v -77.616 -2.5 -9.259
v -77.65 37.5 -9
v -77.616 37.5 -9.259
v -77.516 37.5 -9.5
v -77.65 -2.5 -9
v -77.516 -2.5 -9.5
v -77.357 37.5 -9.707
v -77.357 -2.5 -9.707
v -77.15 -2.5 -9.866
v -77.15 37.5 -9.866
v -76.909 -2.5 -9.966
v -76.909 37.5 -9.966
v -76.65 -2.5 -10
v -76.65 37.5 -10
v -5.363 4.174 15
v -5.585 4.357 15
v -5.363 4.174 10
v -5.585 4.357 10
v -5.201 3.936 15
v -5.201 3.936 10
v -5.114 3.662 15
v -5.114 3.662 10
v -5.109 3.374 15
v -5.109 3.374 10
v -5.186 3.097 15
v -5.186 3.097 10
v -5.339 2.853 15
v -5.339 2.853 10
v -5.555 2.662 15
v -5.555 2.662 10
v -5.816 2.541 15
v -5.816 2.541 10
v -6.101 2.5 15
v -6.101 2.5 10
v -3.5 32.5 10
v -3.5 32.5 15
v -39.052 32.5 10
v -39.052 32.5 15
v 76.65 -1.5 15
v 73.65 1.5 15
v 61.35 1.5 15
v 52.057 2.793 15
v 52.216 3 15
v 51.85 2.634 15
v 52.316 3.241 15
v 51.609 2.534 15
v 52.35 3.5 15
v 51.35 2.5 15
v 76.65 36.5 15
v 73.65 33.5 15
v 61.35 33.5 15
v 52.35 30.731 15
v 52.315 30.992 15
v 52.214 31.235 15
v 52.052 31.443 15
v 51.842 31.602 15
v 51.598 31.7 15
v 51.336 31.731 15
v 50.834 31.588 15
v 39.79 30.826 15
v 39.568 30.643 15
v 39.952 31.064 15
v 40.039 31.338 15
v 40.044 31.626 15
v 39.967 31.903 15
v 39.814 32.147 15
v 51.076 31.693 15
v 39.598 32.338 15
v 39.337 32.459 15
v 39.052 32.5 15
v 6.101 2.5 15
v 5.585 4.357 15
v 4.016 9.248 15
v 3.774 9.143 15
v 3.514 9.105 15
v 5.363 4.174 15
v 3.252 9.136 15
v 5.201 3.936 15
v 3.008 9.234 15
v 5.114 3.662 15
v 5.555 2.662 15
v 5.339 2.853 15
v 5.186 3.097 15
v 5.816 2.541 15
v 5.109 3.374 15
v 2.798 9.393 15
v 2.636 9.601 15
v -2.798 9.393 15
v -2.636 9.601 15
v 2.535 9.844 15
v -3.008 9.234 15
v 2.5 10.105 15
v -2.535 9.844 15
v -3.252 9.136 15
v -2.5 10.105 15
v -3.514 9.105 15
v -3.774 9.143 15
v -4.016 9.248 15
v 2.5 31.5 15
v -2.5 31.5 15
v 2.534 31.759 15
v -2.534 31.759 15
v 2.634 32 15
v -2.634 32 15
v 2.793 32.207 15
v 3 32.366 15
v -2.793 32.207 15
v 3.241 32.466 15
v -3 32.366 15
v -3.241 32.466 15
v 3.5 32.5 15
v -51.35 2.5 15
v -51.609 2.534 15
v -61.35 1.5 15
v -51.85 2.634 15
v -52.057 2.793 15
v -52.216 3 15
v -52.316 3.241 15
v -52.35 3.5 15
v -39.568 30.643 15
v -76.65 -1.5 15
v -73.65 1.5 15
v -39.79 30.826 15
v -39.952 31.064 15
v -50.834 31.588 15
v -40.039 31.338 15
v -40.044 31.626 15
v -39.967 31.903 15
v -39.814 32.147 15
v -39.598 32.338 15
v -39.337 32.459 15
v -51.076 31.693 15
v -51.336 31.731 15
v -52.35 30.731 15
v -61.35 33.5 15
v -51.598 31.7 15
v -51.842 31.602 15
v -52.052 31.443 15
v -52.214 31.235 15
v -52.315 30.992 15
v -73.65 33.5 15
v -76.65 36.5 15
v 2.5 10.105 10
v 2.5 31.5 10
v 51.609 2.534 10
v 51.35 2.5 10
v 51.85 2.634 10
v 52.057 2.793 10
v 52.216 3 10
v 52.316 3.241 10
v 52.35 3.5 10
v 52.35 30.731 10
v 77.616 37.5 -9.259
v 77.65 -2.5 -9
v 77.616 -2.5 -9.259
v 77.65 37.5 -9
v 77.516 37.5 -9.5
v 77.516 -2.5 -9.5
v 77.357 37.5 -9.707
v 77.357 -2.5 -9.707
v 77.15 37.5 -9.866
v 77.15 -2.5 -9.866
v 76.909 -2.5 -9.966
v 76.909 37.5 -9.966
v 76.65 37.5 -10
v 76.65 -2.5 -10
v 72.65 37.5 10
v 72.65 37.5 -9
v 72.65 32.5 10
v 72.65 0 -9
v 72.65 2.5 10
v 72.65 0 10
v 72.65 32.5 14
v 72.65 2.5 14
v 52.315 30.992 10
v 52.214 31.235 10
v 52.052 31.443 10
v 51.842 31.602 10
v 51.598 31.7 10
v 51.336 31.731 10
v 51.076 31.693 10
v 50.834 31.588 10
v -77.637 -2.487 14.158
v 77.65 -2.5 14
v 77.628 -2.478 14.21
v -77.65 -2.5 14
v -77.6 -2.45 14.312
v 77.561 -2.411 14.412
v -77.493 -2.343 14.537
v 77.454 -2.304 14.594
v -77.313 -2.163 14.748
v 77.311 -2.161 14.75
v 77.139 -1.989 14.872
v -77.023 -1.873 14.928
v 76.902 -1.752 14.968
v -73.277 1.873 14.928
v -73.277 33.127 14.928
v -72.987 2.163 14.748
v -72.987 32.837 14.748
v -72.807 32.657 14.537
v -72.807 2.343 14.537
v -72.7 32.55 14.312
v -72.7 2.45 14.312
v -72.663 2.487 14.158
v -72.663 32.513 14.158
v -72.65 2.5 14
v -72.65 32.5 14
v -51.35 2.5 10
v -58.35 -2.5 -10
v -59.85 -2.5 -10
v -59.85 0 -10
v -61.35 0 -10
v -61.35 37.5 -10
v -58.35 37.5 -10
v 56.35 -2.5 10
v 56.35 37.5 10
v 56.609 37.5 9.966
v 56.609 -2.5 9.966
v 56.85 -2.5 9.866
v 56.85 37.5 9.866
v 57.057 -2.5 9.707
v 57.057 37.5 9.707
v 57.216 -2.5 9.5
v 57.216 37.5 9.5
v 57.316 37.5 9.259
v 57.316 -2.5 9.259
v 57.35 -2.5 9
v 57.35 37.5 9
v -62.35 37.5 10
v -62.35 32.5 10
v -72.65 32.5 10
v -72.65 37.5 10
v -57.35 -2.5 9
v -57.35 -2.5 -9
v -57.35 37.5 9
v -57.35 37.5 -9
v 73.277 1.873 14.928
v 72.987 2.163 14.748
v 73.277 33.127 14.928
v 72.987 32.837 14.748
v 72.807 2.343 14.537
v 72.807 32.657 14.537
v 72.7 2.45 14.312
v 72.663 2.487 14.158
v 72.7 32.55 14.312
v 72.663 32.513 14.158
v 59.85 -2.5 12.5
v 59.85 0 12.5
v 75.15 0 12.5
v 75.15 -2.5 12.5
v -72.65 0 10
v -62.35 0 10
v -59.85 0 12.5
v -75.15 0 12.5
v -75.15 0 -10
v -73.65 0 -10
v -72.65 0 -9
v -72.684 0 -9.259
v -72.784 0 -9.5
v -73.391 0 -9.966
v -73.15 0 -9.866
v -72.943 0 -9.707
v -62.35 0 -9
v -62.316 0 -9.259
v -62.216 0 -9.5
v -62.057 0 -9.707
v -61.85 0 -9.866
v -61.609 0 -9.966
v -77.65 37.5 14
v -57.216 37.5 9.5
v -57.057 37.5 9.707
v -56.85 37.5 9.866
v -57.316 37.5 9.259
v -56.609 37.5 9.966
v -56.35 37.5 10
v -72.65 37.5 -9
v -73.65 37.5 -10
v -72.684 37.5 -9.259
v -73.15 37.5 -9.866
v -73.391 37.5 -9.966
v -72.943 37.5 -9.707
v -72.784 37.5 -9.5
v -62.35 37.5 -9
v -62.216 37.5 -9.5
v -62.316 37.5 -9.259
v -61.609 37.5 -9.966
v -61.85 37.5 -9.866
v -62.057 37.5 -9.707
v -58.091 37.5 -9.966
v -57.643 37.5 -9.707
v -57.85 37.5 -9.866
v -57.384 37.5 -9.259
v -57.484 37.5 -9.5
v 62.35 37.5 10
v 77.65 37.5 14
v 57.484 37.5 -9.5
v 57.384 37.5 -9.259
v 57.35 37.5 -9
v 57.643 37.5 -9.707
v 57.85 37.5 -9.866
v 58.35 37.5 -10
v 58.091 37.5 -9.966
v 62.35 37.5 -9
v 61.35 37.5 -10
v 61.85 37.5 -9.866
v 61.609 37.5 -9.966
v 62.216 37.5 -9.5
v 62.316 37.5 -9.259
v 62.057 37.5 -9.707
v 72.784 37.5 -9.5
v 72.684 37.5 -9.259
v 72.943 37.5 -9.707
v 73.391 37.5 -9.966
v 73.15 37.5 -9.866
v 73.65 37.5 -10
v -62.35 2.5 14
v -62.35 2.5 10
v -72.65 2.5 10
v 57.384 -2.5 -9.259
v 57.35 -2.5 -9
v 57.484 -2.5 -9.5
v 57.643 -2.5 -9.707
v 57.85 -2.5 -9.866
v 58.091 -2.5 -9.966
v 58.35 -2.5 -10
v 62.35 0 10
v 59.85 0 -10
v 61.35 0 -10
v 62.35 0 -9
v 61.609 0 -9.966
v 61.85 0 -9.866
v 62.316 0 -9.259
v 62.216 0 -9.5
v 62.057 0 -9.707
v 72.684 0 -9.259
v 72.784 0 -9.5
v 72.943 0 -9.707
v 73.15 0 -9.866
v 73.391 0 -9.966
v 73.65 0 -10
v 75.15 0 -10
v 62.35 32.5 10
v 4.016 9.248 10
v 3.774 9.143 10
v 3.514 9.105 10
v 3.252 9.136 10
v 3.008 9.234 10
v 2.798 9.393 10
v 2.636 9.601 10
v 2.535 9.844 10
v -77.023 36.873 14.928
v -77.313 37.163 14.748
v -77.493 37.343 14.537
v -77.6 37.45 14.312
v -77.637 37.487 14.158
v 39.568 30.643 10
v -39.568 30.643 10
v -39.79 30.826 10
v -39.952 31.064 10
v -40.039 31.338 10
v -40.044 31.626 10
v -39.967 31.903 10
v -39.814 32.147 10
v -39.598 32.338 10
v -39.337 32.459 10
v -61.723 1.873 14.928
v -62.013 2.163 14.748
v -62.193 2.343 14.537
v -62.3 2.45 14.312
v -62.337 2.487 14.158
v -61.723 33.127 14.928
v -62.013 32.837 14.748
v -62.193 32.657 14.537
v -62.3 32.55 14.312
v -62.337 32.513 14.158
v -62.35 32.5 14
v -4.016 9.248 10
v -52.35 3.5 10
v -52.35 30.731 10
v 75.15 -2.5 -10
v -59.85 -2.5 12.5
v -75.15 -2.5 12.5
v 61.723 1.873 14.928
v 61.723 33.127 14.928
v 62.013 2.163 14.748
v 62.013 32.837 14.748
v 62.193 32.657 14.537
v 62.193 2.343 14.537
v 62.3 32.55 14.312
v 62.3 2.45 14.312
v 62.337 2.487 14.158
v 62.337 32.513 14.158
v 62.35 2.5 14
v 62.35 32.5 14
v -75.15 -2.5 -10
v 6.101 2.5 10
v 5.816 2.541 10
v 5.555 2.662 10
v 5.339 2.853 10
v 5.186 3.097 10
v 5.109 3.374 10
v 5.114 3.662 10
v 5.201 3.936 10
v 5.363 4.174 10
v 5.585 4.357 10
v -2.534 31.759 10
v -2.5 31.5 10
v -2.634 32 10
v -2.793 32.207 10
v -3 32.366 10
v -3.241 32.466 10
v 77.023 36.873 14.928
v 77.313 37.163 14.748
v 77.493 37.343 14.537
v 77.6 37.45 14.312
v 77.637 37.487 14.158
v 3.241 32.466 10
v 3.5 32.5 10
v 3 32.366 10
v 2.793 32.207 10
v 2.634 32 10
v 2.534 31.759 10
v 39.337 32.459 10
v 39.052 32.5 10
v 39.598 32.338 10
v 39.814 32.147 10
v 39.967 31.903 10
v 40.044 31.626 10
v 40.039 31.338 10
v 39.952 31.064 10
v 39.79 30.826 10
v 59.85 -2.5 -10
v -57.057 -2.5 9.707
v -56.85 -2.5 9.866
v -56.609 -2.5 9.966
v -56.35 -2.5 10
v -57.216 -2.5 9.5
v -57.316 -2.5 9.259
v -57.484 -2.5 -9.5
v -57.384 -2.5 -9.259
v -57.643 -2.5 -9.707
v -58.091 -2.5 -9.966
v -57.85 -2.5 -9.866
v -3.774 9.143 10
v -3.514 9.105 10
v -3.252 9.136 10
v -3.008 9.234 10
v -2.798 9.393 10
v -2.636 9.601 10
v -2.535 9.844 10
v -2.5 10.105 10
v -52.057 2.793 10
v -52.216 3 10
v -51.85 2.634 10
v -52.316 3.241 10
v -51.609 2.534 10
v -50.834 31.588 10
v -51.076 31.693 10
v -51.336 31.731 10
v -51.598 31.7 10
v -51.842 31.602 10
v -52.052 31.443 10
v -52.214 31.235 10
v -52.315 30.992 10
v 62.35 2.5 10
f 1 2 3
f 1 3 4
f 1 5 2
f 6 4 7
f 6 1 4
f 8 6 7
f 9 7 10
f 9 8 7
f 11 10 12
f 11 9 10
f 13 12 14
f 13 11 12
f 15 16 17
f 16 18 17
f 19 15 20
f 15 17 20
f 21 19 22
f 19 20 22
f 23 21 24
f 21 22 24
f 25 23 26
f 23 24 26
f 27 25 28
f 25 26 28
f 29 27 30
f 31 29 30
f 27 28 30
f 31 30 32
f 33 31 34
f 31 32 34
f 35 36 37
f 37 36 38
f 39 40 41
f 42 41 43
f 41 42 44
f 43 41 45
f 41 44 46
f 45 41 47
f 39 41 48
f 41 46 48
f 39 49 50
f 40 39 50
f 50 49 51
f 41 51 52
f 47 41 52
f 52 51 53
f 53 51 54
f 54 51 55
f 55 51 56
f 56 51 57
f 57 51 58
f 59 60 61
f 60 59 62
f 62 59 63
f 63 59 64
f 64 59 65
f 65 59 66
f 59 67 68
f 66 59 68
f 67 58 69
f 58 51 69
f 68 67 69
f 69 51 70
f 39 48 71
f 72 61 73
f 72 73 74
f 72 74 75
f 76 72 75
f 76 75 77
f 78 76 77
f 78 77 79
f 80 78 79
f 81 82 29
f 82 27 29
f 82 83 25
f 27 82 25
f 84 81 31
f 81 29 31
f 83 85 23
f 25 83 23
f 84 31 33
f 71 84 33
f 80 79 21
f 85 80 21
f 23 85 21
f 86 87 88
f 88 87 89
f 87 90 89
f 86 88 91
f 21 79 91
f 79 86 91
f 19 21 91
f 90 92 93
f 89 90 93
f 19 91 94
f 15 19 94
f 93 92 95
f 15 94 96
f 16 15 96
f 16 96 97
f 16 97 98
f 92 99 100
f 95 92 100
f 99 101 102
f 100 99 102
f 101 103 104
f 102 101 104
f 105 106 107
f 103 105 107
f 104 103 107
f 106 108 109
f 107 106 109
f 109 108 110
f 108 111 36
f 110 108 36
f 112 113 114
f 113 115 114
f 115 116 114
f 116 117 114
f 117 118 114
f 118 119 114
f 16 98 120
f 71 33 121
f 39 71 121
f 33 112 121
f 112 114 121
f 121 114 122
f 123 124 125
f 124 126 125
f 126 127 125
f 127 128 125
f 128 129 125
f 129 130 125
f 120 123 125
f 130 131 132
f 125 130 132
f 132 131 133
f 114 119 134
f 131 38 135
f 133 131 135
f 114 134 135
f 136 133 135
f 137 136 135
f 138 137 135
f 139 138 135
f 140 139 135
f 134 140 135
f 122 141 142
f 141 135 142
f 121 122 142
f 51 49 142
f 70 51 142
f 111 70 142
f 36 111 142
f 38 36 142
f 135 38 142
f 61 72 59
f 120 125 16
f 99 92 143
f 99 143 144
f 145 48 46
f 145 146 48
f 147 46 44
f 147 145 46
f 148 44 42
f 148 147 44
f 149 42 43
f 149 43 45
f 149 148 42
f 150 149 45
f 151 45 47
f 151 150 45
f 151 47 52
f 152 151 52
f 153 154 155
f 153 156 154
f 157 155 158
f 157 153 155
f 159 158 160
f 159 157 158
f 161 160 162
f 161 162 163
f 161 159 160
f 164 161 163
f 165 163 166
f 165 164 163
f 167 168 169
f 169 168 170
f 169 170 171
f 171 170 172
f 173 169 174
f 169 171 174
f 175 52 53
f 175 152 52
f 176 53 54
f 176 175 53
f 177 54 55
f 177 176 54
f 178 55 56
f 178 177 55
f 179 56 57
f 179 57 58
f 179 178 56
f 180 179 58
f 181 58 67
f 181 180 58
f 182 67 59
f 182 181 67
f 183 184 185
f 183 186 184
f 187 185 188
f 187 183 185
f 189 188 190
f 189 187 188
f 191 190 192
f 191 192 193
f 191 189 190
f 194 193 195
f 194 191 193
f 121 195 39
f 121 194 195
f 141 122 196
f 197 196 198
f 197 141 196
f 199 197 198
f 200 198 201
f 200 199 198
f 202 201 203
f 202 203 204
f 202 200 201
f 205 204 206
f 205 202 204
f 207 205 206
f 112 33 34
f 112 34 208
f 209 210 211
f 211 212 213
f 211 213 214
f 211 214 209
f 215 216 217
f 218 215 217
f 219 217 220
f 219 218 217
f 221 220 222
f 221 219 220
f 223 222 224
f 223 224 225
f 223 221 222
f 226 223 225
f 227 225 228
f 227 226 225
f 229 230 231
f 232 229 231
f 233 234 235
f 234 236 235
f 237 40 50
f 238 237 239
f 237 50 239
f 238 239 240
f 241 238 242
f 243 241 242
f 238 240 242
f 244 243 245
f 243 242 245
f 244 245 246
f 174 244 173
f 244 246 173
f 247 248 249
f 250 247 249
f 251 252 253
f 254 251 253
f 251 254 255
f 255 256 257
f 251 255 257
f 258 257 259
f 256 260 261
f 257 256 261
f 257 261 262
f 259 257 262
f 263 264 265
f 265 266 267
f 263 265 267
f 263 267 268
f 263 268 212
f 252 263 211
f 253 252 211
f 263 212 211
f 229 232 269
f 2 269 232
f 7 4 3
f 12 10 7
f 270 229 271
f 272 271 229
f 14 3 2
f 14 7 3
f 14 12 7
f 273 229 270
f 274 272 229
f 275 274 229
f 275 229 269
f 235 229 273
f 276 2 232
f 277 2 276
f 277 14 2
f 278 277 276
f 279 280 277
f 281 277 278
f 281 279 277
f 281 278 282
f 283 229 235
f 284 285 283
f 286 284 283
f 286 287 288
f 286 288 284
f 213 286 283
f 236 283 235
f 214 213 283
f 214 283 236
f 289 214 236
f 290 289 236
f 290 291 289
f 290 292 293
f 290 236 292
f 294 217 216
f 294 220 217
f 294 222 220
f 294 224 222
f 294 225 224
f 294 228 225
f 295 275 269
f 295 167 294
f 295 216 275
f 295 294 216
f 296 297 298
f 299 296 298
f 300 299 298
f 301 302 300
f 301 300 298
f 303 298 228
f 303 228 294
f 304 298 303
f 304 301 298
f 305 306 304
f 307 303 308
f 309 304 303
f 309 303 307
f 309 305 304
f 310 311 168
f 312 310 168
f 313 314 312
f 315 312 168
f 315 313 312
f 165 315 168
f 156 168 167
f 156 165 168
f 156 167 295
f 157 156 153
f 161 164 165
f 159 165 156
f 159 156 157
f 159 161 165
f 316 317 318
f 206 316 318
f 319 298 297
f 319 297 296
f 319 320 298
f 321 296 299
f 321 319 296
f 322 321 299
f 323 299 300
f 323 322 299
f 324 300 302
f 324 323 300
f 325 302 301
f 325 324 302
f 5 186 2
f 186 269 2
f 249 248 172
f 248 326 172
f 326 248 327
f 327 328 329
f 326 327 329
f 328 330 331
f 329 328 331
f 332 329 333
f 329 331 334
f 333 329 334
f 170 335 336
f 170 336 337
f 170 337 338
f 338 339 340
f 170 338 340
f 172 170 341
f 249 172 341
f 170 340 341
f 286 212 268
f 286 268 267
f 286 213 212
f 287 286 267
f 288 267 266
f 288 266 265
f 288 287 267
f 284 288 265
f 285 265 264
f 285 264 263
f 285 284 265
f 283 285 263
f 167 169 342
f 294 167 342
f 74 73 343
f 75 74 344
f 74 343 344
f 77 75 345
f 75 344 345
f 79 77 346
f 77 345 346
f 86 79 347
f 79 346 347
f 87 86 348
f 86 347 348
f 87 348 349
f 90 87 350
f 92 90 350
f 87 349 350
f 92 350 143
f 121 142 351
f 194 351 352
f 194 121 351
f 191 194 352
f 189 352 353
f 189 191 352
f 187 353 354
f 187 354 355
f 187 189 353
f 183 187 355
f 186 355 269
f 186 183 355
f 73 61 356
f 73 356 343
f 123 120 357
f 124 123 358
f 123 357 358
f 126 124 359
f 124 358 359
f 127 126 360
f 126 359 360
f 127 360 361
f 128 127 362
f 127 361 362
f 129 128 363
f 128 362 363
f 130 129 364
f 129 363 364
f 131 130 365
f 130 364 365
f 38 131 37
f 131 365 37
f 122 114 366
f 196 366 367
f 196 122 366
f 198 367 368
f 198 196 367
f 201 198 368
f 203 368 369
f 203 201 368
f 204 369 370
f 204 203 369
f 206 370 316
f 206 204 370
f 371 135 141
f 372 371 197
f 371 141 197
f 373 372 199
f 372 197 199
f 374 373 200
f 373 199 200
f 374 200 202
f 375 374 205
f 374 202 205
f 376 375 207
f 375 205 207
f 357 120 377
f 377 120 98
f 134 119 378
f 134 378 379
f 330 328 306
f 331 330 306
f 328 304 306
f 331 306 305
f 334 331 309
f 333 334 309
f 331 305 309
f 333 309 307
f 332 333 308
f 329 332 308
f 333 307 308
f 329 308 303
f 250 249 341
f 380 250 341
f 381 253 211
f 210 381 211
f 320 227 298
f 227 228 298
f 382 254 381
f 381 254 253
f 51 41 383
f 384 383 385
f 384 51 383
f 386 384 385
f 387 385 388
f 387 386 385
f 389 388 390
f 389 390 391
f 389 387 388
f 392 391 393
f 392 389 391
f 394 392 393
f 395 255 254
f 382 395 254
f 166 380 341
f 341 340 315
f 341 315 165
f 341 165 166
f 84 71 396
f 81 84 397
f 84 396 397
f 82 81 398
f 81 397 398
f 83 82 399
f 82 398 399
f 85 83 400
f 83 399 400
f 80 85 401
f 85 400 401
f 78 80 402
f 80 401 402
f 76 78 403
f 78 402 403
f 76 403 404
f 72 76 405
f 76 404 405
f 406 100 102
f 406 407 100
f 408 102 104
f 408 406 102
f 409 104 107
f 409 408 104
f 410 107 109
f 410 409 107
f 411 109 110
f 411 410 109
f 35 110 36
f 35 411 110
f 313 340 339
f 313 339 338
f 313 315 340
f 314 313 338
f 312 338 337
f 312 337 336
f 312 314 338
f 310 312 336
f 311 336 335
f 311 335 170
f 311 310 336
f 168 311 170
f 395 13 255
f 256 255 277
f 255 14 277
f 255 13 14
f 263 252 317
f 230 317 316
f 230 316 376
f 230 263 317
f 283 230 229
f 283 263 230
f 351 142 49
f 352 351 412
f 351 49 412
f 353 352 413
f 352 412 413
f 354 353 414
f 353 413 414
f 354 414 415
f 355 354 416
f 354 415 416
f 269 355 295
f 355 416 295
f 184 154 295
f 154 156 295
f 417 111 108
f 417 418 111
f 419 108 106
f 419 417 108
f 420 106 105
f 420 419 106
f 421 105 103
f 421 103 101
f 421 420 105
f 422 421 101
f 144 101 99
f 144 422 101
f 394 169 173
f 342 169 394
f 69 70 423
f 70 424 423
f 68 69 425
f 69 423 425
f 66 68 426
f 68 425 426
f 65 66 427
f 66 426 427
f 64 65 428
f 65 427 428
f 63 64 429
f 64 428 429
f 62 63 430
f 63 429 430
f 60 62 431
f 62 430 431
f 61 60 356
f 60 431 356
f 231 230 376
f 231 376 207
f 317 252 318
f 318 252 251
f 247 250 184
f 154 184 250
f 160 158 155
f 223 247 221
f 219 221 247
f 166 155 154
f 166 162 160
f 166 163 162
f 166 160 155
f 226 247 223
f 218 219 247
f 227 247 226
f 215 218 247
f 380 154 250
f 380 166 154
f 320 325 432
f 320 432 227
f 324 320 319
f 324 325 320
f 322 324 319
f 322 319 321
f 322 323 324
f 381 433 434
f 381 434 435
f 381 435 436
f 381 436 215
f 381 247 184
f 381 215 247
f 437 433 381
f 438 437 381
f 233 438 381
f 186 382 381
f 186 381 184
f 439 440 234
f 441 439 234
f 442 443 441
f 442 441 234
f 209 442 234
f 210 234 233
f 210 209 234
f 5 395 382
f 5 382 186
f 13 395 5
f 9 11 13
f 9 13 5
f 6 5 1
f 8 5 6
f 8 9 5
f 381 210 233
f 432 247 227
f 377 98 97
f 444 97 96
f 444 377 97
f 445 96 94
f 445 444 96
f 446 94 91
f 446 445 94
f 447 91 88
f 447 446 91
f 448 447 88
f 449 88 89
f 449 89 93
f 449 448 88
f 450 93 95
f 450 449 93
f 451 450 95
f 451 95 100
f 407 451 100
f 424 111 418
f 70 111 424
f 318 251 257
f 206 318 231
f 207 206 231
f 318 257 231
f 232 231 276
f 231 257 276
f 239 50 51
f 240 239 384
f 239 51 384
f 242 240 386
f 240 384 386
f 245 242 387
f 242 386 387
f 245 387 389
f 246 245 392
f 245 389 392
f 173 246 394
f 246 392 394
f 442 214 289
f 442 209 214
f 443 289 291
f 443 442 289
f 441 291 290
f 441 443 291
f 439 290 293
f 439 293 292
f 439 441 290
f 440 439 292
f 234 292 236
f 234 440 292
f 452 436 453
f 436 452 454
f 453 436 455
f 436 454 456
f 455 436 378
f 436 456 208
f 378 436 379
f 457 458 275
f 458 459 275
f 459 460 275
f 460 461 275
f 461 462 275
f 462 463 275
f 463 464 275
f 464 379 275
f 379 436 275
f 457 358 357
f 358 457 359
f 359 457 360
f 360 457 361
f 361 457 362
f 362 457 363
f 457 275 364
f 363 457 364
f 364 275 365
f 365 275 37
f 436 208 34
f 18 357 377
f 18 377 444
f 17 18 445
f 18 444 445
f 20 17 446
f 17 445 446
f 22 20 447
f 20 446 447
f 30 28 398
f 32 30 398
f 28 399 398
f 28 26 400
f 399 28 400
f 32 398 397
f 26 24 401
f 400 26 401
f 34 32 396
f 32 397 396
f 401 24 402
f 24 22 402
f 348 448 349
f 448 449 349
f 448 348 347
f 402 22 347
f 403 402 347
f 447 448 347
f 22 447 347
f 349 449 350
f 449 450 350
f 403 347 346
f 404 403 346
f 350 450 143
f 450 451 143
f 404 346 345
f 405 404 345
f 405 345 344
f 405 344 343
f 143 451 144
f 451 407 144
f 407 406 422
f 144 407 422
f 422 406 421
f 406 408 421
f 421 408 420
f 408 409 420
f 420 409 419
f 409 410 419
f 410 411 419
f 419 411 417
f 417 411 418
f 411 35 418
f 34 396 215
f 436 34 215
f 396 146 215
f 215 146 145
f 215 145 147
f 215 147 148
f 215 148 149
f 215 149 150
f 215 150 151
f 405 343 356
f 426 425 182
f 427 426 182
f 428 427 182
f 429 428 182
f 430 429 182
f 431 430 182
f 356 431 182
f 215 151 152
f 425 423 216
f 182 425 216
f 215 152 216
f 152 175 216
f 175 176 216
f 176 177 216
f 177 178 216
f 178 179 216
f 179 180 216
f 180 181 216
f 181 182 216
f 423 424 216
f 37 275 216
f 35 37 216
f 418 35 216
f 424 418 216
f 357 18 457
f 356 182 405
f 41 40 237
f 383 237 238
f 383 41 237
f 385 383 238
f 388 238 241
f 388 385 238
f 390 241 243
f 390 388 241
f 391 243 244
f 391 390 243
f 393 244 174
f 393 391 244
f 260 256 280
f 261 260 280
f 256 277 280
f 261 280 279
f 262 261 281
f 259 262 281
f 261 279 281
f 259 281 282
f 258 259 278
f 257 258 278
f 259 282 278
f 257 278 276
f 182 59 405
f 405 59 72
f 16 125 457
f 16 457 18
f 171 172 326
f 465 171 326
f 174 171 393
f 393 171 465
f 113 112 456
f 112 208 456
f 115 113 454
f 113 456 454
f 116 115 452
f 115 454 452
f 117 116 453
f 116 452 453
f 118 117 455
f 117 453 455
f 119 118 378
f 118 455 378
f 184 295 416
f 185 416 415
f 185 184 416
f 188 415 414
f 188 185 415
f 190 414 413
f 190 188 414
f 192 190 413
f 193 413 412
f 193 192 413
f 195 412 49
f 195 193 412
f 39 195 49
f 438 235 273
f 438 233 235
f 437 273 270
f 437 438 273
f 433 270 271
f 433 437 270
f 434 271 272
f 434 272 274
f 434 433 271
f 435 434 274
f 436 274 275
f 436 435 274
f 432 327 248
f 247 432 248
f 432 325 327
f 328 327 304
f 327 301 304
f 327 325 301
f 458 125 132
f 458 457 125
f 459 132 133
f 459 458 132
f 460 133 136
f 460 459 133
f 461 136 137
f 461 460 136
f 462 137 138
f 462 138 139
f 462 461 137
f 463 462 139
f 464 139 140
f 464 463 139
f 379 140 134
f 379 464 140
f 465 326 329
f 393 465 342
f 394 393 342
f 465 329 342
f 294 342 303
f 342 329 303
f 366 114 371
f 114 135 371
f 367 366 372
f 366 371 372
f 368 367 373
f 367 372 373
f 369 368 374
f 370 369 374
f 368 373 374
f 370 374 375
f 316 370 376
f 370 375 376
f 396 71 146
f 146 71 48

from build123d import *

# Parameters (mm, degrees)
BOSS_EXTRUDE2_DEPTH     = 37.5
BOSS_EXTRUDE3_DEPTH     = 2.5
CUT_EXTRUDE1_DEPTH      = 89.519898893
CUT_EXTRUDE1_DEPTH_BACK = 89.519898893
SKETCH8_W               = 10.3
SKETCH8_H               = 30
CUT_EXTRUDE3_DEPTH      = 89.519898893
FILLET1_R               = 1


with BuildPart() as part:
    # Sketch2 → Boss-Extrude2 (new body)
    with BuildSketch(Plane(origin=(0, 0, 0), x_dir=(1, 0, 0), z_dir=(0, 1, 0))):
        Polygon((77.65, -15), (77.65, 10), (72.65, 10), (72.65, -10), (62.35, -10), (62.35, 10), (57.35, 10), (57.35, -10), (-57.35, -10), (-57.35, 10), (-62.35, 10), (-62.35, -10), (-72.65, -10), (-72.65, 10), (-77.65, 10), (-77.65, -15), align=None)
    extrude(amount=BOSS_EXTRUDE2_DEPTH)

    # Sketch3 → Boss-Extrude3 (add)
    with BuildSketch(Plane(origin=(0, 0, 0), x_dir=(1, 0, 0), z_dir=(0, 1, 0))):
        Polygon((77.65, 10), (77.65, -15), (-77.65, -15), (-77.65, 10), (-75.15, 10), (-75.15, -12.5), (-59.85, -12.5), (-59.85, 10), (-57.35, 10), (-57.35, -10), (57.35, -10), (57.35, 10), (59.85, 10), (59.85, -12.5), (75.15, -12.5), (75.15, 10), align=None)
    extrude(amount=-BOSS_EXTRUDE3_DEPTH)

    # Sketch4 → Cut-Extrude1 (cut, two sides: drawn at the far end of the back side and taken through both)
    with BuildSketch(Plane(origin=(0, 0, 10), x_dir=(-1, 0, 0), z_dir=(0, 0, -1)).offset(-CUT_EXTRUDE1_DEPTH_BACK)):
        Polygon((52.35, 2.5), (52.35, 32.5), (2.5, 2.5), align=None)
        Polygon((-2.5, 2.5), (-52.35, 2.5), (-52.35, 32.5), align=None)
        Polygon((42.653175634, 32.5), (2.5, 8.335601424), (2.5, 32.5), align=None)
        Polygon((-2.5, 8.335601424), (-2.5, 32.5), (-42.653175634, 32.5), align=None)
    extrude(amount=CUT_EXTRUDE1_DEPTH + CUT_EXTRUDE1_DEPTH_BACK, mode=Mode.SUBTRACT)

    # Sketch8 → Cut-Extrude3 (cut, through all)
    with BuildSketch(Plane(origin=(0, 0, 10), x_dir=(-1, 0, 0), z_dir=(0, 0, -1))):
        with Locations((67.5, 17.5)):
            Rectangle(SKETCH8_W, SKETCH8_H)
        with Locations((-67.5, 17.5)):
            Rectangle(SKETCH8_W, SKETCH8_H)
    extrude(amount=-CUT_EXTRUDE3_DEPTH, mode=Mode.SUBTRACT)

    # Fillet1
    fillet1_edges = [part.edges().sort_by_distance(p)[0] for p in [
        (2.5, 8.335601424, 12.5),
        (42.653175634, 32.5, 12.5),
        (2.5, 32.5, 12.5),
        (-52.35, 2.5, 12.5),
        (-2.5, 2.5, 12.5),
        (-52.35, 32.5, 12.5),
        (-2.5, 32.5, 12.5),
        (-42.653175634, 32.5, 12.5),
        (-2.5, 8.335601424, 12.5),
        (52.35, 32.5, 12.5),
        (2.5, 2.5, 12.5),
        (52.35, 2.5, 12.5),
        (-72.65, 17.5, 15),
        (-67.5, 2.5, 15),
        (-62.35, 17.5, 15),
        (-67.5, 32.5, 15),
        (62.35, 17.5, 15),
        (67.5, 2.5, 15),
        (72.65, 17.5, 15),
        (67.5, 32.5, 15),
        (0, 37.5, 15),
        (-62.35, 18.75, -10),
        (-57.35, 17.5, -10),
        (-57.35, 17.5, 10),
        (57.35, 17.5, 10),
        (57.35, 17.5, -10),
        (62.35, 18.75, -10),
        (72.65, 18.75, -10),
        (77.65, 17.5, -10),
        (77.65, 17.5, 15),
        (-77.65, 17.5, 15),
        (-77.65, 17.5, -10),
        (-72.65, 18.75, -10),
        (0, -2.5, 15),
    ]]
    fillet(fillet1_edges, radius=FILLET1_R)


solid = part.part
